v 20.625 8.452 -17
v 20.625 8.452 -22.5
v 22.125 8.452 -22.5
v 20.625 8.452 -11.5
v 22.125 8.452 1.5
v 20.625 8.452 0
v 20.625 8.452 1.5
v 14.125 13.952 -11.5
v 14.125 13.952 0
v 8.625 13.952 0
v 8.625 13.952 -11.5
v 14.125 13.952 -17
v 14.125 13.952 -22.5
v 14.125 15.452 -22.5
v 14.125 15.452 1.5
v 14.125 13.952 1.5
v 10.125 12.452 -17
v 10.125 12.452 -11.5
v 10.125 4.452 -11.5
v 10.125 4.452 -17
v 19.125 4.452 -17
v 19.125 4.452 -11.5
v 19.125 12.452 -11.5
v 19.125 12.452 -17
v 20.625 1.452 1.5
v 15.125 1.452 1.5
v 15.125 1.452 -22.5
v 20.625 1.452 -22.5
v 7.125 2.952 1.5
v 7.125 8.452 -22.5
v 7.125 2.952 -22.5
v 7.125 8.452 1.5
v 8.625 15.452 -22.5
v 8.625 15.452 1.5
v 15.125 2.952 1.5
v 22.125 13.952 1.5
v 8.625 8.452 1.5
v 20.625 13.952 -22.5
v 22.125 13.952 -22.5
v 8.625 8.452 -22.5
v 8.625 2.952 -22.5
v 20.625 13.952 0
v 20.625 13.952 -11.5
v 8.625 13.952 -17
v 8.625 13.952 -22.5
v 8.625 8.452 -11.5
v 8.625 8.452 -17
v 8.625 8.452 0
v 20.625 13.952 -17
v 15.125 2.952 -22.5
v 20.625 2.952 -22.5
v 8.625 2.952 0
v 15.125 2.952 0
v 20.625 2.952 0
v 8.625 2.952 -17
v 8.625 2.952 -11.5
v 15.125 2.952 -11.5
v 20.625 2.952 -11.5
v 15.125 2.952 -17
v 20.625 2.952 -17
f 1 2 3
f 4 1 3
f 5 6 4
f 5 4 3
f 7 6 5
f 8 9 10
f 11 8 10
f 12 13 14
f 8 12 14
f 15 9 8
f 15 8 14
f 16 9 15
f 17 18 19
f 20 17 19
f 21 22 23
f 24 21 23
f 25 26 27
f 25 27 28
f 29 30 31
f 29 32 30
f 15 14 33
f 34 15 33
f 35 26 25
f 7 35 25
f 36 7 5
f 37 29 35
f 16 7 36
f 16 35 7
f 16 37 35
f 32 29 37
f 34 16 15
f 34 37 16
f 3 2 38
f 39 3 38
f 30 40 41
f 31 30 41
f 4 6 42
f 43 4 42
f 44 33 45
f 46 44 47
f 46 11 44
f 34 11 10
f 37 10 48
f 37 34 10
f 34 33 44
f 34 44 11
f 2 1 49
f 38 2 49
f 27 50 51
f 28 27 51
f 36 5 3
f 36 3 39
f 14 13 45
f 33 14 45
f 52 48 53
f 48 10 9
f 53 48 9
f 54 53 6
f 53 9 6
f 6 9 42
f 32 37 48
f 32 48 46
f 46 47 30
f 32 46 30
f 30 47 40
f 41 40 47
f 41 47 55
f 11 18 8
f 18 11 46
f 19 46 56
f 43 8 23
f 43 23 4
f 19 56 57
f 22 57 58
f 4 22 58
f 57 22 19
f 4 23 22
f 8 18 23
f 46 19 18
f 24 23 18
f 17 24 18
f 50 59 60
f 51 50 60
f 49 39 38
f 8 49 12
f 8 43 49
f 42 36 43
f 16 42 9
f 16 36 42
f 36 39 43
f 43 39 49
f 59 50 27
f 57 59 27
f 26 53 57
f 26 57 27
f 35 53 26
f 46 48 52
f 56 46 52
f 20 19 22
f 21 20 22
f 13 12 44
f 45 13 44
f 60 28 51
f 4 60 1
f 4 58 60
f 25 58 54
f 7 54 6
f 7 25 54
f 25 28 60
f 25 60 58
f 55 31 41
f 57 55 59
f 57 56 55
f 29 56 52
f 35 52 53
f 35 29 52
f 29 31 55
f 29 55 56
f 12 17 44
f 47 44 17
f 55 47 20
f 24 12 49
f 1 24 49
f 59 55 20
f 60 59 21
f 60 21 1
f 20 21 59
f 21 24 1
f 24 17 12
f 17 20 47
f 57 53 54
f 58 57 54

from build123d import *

# Parameters (mm, degrees)
F0_W      = 12
F0_H      = 5.5
F1_DEPTH  = 1.5
F2_W      = 5.5
F2_H      = 24
F3_DEPTH  = 1.5
F4_W      = 5.5
F4_H      = 22.5
F4_H_2    = 1.5
F5_DEPTH  = 1.5
F6_W      = 5.5
F6_H      = 24
F7_DEPTH  = 1.5
F8_W      = 5.5
F8_H      = 24
F9_DEPTH  = 1.5
F10_W     = 9.5
F10_H     = 5.5
F11_DEPTH = 1.5
F12_W     = 10.5
F12_H     = 5.5
F13_DEPTH = 1.5
F14_W     = 9.5
F14_H     = 5.5
F15_DEPTH = 1.5
F16_W     = 10.5
F16_H     = 5.5
F17_DEPTH = 1.5


with BuildPart() as f1:
    # F0 (on Top) → F1 (new body)
    with BuildSketch(Plane.XY):
        with Locations((14.625001, 11.201556)):
            Rectangle(F0_W, F0_H)
        with Locations((14.625001, 5.701556)):
            Rectangle(F0_W, F0_H)
    extrude(amount=F1_DEPTH)

    # F2 (on face) → F3 (join)
    with BuildSketch(Plane.XZ.offset(-2.951556)):
        with Locations((17.875001, -10.5)):
            Rectangle(F2_W, F2_H)
    extrude(amount=F3_DEPTH)

    # F4 (on face) → F5 (join)
    with BuildSketch(Plane(origin=(8.625001, 0, 0), x_dir=(0, -1, 0), z_dir=(-1, 0, 0))):
        with Locations((-5.701556, -11.25)):
            Rectangle(F4_W, F4_H)
        with Locations((-5.701556, 0.75)):
            Rectangle(F4_W, F4_H_2)
    extrude(amount=F5_DEPTH)

    # F6 (on face) → F7 (join)
    with BuildSketch(Plane(origin=(0, 13.951556, 0), x_dir=(-1, 0, 0), z_dir=(0, 1, 0))):
        with Locations((-11.375001, -10.5)):
            Rectangle(F6_W, F6_H)
    extrude(amount=F7_DEPTH)

    # F8 (on face) → F9 (join)
    with BuildSketch(Plane.YZ.offset(20.625001)):
        with Locations((11.201556, -10.5)):
            Rectangle(F8_W, F8_H)
    extrude(amount=F9_DEPTH)

    # F10 (on face) → F11 (join)
    with BuildSketch(Plane(origin=(8.625001, 0, 0), x_dir=(0, -1, 0), z_dir=(-1, 0, 0))):
        with Locations((-9.201556, -14.25)):
            Rectangle(F10_W, F10_H)
    extrude(amount=-F11_DEPTH)

    # F12 (on face) → F13 (join)
    with BuildSketch(Plane(origin=(0, 13.951556, 0), x_dir=(-1, 0, 0), z_dir=(0, 1, 0))):
        with Locations((-15.375001, -14.25)):
            Rectangle(F12_W, F12_H)
    extrude(amount=-F13_DEPTH)

    # F14 (on face) → F15 (join)
    with BuildSketch(Plane.YZ.offset(20.625001)):
        with Locations((7.701556, -14.25)):
            Rectangle(F14_W, F14_H)
    extrude(amount=-F15_DEPTH)

    # F16 (on face) → F17 (join)
    with BuildSketch(Plane.XZ.offset(-2.951556)):
        with Locations((13.875001, -14.25)):
            Rectangle(F16_W, F16_H)
    extrude(amount=-F17_DEPTH)


solid = f1.part
